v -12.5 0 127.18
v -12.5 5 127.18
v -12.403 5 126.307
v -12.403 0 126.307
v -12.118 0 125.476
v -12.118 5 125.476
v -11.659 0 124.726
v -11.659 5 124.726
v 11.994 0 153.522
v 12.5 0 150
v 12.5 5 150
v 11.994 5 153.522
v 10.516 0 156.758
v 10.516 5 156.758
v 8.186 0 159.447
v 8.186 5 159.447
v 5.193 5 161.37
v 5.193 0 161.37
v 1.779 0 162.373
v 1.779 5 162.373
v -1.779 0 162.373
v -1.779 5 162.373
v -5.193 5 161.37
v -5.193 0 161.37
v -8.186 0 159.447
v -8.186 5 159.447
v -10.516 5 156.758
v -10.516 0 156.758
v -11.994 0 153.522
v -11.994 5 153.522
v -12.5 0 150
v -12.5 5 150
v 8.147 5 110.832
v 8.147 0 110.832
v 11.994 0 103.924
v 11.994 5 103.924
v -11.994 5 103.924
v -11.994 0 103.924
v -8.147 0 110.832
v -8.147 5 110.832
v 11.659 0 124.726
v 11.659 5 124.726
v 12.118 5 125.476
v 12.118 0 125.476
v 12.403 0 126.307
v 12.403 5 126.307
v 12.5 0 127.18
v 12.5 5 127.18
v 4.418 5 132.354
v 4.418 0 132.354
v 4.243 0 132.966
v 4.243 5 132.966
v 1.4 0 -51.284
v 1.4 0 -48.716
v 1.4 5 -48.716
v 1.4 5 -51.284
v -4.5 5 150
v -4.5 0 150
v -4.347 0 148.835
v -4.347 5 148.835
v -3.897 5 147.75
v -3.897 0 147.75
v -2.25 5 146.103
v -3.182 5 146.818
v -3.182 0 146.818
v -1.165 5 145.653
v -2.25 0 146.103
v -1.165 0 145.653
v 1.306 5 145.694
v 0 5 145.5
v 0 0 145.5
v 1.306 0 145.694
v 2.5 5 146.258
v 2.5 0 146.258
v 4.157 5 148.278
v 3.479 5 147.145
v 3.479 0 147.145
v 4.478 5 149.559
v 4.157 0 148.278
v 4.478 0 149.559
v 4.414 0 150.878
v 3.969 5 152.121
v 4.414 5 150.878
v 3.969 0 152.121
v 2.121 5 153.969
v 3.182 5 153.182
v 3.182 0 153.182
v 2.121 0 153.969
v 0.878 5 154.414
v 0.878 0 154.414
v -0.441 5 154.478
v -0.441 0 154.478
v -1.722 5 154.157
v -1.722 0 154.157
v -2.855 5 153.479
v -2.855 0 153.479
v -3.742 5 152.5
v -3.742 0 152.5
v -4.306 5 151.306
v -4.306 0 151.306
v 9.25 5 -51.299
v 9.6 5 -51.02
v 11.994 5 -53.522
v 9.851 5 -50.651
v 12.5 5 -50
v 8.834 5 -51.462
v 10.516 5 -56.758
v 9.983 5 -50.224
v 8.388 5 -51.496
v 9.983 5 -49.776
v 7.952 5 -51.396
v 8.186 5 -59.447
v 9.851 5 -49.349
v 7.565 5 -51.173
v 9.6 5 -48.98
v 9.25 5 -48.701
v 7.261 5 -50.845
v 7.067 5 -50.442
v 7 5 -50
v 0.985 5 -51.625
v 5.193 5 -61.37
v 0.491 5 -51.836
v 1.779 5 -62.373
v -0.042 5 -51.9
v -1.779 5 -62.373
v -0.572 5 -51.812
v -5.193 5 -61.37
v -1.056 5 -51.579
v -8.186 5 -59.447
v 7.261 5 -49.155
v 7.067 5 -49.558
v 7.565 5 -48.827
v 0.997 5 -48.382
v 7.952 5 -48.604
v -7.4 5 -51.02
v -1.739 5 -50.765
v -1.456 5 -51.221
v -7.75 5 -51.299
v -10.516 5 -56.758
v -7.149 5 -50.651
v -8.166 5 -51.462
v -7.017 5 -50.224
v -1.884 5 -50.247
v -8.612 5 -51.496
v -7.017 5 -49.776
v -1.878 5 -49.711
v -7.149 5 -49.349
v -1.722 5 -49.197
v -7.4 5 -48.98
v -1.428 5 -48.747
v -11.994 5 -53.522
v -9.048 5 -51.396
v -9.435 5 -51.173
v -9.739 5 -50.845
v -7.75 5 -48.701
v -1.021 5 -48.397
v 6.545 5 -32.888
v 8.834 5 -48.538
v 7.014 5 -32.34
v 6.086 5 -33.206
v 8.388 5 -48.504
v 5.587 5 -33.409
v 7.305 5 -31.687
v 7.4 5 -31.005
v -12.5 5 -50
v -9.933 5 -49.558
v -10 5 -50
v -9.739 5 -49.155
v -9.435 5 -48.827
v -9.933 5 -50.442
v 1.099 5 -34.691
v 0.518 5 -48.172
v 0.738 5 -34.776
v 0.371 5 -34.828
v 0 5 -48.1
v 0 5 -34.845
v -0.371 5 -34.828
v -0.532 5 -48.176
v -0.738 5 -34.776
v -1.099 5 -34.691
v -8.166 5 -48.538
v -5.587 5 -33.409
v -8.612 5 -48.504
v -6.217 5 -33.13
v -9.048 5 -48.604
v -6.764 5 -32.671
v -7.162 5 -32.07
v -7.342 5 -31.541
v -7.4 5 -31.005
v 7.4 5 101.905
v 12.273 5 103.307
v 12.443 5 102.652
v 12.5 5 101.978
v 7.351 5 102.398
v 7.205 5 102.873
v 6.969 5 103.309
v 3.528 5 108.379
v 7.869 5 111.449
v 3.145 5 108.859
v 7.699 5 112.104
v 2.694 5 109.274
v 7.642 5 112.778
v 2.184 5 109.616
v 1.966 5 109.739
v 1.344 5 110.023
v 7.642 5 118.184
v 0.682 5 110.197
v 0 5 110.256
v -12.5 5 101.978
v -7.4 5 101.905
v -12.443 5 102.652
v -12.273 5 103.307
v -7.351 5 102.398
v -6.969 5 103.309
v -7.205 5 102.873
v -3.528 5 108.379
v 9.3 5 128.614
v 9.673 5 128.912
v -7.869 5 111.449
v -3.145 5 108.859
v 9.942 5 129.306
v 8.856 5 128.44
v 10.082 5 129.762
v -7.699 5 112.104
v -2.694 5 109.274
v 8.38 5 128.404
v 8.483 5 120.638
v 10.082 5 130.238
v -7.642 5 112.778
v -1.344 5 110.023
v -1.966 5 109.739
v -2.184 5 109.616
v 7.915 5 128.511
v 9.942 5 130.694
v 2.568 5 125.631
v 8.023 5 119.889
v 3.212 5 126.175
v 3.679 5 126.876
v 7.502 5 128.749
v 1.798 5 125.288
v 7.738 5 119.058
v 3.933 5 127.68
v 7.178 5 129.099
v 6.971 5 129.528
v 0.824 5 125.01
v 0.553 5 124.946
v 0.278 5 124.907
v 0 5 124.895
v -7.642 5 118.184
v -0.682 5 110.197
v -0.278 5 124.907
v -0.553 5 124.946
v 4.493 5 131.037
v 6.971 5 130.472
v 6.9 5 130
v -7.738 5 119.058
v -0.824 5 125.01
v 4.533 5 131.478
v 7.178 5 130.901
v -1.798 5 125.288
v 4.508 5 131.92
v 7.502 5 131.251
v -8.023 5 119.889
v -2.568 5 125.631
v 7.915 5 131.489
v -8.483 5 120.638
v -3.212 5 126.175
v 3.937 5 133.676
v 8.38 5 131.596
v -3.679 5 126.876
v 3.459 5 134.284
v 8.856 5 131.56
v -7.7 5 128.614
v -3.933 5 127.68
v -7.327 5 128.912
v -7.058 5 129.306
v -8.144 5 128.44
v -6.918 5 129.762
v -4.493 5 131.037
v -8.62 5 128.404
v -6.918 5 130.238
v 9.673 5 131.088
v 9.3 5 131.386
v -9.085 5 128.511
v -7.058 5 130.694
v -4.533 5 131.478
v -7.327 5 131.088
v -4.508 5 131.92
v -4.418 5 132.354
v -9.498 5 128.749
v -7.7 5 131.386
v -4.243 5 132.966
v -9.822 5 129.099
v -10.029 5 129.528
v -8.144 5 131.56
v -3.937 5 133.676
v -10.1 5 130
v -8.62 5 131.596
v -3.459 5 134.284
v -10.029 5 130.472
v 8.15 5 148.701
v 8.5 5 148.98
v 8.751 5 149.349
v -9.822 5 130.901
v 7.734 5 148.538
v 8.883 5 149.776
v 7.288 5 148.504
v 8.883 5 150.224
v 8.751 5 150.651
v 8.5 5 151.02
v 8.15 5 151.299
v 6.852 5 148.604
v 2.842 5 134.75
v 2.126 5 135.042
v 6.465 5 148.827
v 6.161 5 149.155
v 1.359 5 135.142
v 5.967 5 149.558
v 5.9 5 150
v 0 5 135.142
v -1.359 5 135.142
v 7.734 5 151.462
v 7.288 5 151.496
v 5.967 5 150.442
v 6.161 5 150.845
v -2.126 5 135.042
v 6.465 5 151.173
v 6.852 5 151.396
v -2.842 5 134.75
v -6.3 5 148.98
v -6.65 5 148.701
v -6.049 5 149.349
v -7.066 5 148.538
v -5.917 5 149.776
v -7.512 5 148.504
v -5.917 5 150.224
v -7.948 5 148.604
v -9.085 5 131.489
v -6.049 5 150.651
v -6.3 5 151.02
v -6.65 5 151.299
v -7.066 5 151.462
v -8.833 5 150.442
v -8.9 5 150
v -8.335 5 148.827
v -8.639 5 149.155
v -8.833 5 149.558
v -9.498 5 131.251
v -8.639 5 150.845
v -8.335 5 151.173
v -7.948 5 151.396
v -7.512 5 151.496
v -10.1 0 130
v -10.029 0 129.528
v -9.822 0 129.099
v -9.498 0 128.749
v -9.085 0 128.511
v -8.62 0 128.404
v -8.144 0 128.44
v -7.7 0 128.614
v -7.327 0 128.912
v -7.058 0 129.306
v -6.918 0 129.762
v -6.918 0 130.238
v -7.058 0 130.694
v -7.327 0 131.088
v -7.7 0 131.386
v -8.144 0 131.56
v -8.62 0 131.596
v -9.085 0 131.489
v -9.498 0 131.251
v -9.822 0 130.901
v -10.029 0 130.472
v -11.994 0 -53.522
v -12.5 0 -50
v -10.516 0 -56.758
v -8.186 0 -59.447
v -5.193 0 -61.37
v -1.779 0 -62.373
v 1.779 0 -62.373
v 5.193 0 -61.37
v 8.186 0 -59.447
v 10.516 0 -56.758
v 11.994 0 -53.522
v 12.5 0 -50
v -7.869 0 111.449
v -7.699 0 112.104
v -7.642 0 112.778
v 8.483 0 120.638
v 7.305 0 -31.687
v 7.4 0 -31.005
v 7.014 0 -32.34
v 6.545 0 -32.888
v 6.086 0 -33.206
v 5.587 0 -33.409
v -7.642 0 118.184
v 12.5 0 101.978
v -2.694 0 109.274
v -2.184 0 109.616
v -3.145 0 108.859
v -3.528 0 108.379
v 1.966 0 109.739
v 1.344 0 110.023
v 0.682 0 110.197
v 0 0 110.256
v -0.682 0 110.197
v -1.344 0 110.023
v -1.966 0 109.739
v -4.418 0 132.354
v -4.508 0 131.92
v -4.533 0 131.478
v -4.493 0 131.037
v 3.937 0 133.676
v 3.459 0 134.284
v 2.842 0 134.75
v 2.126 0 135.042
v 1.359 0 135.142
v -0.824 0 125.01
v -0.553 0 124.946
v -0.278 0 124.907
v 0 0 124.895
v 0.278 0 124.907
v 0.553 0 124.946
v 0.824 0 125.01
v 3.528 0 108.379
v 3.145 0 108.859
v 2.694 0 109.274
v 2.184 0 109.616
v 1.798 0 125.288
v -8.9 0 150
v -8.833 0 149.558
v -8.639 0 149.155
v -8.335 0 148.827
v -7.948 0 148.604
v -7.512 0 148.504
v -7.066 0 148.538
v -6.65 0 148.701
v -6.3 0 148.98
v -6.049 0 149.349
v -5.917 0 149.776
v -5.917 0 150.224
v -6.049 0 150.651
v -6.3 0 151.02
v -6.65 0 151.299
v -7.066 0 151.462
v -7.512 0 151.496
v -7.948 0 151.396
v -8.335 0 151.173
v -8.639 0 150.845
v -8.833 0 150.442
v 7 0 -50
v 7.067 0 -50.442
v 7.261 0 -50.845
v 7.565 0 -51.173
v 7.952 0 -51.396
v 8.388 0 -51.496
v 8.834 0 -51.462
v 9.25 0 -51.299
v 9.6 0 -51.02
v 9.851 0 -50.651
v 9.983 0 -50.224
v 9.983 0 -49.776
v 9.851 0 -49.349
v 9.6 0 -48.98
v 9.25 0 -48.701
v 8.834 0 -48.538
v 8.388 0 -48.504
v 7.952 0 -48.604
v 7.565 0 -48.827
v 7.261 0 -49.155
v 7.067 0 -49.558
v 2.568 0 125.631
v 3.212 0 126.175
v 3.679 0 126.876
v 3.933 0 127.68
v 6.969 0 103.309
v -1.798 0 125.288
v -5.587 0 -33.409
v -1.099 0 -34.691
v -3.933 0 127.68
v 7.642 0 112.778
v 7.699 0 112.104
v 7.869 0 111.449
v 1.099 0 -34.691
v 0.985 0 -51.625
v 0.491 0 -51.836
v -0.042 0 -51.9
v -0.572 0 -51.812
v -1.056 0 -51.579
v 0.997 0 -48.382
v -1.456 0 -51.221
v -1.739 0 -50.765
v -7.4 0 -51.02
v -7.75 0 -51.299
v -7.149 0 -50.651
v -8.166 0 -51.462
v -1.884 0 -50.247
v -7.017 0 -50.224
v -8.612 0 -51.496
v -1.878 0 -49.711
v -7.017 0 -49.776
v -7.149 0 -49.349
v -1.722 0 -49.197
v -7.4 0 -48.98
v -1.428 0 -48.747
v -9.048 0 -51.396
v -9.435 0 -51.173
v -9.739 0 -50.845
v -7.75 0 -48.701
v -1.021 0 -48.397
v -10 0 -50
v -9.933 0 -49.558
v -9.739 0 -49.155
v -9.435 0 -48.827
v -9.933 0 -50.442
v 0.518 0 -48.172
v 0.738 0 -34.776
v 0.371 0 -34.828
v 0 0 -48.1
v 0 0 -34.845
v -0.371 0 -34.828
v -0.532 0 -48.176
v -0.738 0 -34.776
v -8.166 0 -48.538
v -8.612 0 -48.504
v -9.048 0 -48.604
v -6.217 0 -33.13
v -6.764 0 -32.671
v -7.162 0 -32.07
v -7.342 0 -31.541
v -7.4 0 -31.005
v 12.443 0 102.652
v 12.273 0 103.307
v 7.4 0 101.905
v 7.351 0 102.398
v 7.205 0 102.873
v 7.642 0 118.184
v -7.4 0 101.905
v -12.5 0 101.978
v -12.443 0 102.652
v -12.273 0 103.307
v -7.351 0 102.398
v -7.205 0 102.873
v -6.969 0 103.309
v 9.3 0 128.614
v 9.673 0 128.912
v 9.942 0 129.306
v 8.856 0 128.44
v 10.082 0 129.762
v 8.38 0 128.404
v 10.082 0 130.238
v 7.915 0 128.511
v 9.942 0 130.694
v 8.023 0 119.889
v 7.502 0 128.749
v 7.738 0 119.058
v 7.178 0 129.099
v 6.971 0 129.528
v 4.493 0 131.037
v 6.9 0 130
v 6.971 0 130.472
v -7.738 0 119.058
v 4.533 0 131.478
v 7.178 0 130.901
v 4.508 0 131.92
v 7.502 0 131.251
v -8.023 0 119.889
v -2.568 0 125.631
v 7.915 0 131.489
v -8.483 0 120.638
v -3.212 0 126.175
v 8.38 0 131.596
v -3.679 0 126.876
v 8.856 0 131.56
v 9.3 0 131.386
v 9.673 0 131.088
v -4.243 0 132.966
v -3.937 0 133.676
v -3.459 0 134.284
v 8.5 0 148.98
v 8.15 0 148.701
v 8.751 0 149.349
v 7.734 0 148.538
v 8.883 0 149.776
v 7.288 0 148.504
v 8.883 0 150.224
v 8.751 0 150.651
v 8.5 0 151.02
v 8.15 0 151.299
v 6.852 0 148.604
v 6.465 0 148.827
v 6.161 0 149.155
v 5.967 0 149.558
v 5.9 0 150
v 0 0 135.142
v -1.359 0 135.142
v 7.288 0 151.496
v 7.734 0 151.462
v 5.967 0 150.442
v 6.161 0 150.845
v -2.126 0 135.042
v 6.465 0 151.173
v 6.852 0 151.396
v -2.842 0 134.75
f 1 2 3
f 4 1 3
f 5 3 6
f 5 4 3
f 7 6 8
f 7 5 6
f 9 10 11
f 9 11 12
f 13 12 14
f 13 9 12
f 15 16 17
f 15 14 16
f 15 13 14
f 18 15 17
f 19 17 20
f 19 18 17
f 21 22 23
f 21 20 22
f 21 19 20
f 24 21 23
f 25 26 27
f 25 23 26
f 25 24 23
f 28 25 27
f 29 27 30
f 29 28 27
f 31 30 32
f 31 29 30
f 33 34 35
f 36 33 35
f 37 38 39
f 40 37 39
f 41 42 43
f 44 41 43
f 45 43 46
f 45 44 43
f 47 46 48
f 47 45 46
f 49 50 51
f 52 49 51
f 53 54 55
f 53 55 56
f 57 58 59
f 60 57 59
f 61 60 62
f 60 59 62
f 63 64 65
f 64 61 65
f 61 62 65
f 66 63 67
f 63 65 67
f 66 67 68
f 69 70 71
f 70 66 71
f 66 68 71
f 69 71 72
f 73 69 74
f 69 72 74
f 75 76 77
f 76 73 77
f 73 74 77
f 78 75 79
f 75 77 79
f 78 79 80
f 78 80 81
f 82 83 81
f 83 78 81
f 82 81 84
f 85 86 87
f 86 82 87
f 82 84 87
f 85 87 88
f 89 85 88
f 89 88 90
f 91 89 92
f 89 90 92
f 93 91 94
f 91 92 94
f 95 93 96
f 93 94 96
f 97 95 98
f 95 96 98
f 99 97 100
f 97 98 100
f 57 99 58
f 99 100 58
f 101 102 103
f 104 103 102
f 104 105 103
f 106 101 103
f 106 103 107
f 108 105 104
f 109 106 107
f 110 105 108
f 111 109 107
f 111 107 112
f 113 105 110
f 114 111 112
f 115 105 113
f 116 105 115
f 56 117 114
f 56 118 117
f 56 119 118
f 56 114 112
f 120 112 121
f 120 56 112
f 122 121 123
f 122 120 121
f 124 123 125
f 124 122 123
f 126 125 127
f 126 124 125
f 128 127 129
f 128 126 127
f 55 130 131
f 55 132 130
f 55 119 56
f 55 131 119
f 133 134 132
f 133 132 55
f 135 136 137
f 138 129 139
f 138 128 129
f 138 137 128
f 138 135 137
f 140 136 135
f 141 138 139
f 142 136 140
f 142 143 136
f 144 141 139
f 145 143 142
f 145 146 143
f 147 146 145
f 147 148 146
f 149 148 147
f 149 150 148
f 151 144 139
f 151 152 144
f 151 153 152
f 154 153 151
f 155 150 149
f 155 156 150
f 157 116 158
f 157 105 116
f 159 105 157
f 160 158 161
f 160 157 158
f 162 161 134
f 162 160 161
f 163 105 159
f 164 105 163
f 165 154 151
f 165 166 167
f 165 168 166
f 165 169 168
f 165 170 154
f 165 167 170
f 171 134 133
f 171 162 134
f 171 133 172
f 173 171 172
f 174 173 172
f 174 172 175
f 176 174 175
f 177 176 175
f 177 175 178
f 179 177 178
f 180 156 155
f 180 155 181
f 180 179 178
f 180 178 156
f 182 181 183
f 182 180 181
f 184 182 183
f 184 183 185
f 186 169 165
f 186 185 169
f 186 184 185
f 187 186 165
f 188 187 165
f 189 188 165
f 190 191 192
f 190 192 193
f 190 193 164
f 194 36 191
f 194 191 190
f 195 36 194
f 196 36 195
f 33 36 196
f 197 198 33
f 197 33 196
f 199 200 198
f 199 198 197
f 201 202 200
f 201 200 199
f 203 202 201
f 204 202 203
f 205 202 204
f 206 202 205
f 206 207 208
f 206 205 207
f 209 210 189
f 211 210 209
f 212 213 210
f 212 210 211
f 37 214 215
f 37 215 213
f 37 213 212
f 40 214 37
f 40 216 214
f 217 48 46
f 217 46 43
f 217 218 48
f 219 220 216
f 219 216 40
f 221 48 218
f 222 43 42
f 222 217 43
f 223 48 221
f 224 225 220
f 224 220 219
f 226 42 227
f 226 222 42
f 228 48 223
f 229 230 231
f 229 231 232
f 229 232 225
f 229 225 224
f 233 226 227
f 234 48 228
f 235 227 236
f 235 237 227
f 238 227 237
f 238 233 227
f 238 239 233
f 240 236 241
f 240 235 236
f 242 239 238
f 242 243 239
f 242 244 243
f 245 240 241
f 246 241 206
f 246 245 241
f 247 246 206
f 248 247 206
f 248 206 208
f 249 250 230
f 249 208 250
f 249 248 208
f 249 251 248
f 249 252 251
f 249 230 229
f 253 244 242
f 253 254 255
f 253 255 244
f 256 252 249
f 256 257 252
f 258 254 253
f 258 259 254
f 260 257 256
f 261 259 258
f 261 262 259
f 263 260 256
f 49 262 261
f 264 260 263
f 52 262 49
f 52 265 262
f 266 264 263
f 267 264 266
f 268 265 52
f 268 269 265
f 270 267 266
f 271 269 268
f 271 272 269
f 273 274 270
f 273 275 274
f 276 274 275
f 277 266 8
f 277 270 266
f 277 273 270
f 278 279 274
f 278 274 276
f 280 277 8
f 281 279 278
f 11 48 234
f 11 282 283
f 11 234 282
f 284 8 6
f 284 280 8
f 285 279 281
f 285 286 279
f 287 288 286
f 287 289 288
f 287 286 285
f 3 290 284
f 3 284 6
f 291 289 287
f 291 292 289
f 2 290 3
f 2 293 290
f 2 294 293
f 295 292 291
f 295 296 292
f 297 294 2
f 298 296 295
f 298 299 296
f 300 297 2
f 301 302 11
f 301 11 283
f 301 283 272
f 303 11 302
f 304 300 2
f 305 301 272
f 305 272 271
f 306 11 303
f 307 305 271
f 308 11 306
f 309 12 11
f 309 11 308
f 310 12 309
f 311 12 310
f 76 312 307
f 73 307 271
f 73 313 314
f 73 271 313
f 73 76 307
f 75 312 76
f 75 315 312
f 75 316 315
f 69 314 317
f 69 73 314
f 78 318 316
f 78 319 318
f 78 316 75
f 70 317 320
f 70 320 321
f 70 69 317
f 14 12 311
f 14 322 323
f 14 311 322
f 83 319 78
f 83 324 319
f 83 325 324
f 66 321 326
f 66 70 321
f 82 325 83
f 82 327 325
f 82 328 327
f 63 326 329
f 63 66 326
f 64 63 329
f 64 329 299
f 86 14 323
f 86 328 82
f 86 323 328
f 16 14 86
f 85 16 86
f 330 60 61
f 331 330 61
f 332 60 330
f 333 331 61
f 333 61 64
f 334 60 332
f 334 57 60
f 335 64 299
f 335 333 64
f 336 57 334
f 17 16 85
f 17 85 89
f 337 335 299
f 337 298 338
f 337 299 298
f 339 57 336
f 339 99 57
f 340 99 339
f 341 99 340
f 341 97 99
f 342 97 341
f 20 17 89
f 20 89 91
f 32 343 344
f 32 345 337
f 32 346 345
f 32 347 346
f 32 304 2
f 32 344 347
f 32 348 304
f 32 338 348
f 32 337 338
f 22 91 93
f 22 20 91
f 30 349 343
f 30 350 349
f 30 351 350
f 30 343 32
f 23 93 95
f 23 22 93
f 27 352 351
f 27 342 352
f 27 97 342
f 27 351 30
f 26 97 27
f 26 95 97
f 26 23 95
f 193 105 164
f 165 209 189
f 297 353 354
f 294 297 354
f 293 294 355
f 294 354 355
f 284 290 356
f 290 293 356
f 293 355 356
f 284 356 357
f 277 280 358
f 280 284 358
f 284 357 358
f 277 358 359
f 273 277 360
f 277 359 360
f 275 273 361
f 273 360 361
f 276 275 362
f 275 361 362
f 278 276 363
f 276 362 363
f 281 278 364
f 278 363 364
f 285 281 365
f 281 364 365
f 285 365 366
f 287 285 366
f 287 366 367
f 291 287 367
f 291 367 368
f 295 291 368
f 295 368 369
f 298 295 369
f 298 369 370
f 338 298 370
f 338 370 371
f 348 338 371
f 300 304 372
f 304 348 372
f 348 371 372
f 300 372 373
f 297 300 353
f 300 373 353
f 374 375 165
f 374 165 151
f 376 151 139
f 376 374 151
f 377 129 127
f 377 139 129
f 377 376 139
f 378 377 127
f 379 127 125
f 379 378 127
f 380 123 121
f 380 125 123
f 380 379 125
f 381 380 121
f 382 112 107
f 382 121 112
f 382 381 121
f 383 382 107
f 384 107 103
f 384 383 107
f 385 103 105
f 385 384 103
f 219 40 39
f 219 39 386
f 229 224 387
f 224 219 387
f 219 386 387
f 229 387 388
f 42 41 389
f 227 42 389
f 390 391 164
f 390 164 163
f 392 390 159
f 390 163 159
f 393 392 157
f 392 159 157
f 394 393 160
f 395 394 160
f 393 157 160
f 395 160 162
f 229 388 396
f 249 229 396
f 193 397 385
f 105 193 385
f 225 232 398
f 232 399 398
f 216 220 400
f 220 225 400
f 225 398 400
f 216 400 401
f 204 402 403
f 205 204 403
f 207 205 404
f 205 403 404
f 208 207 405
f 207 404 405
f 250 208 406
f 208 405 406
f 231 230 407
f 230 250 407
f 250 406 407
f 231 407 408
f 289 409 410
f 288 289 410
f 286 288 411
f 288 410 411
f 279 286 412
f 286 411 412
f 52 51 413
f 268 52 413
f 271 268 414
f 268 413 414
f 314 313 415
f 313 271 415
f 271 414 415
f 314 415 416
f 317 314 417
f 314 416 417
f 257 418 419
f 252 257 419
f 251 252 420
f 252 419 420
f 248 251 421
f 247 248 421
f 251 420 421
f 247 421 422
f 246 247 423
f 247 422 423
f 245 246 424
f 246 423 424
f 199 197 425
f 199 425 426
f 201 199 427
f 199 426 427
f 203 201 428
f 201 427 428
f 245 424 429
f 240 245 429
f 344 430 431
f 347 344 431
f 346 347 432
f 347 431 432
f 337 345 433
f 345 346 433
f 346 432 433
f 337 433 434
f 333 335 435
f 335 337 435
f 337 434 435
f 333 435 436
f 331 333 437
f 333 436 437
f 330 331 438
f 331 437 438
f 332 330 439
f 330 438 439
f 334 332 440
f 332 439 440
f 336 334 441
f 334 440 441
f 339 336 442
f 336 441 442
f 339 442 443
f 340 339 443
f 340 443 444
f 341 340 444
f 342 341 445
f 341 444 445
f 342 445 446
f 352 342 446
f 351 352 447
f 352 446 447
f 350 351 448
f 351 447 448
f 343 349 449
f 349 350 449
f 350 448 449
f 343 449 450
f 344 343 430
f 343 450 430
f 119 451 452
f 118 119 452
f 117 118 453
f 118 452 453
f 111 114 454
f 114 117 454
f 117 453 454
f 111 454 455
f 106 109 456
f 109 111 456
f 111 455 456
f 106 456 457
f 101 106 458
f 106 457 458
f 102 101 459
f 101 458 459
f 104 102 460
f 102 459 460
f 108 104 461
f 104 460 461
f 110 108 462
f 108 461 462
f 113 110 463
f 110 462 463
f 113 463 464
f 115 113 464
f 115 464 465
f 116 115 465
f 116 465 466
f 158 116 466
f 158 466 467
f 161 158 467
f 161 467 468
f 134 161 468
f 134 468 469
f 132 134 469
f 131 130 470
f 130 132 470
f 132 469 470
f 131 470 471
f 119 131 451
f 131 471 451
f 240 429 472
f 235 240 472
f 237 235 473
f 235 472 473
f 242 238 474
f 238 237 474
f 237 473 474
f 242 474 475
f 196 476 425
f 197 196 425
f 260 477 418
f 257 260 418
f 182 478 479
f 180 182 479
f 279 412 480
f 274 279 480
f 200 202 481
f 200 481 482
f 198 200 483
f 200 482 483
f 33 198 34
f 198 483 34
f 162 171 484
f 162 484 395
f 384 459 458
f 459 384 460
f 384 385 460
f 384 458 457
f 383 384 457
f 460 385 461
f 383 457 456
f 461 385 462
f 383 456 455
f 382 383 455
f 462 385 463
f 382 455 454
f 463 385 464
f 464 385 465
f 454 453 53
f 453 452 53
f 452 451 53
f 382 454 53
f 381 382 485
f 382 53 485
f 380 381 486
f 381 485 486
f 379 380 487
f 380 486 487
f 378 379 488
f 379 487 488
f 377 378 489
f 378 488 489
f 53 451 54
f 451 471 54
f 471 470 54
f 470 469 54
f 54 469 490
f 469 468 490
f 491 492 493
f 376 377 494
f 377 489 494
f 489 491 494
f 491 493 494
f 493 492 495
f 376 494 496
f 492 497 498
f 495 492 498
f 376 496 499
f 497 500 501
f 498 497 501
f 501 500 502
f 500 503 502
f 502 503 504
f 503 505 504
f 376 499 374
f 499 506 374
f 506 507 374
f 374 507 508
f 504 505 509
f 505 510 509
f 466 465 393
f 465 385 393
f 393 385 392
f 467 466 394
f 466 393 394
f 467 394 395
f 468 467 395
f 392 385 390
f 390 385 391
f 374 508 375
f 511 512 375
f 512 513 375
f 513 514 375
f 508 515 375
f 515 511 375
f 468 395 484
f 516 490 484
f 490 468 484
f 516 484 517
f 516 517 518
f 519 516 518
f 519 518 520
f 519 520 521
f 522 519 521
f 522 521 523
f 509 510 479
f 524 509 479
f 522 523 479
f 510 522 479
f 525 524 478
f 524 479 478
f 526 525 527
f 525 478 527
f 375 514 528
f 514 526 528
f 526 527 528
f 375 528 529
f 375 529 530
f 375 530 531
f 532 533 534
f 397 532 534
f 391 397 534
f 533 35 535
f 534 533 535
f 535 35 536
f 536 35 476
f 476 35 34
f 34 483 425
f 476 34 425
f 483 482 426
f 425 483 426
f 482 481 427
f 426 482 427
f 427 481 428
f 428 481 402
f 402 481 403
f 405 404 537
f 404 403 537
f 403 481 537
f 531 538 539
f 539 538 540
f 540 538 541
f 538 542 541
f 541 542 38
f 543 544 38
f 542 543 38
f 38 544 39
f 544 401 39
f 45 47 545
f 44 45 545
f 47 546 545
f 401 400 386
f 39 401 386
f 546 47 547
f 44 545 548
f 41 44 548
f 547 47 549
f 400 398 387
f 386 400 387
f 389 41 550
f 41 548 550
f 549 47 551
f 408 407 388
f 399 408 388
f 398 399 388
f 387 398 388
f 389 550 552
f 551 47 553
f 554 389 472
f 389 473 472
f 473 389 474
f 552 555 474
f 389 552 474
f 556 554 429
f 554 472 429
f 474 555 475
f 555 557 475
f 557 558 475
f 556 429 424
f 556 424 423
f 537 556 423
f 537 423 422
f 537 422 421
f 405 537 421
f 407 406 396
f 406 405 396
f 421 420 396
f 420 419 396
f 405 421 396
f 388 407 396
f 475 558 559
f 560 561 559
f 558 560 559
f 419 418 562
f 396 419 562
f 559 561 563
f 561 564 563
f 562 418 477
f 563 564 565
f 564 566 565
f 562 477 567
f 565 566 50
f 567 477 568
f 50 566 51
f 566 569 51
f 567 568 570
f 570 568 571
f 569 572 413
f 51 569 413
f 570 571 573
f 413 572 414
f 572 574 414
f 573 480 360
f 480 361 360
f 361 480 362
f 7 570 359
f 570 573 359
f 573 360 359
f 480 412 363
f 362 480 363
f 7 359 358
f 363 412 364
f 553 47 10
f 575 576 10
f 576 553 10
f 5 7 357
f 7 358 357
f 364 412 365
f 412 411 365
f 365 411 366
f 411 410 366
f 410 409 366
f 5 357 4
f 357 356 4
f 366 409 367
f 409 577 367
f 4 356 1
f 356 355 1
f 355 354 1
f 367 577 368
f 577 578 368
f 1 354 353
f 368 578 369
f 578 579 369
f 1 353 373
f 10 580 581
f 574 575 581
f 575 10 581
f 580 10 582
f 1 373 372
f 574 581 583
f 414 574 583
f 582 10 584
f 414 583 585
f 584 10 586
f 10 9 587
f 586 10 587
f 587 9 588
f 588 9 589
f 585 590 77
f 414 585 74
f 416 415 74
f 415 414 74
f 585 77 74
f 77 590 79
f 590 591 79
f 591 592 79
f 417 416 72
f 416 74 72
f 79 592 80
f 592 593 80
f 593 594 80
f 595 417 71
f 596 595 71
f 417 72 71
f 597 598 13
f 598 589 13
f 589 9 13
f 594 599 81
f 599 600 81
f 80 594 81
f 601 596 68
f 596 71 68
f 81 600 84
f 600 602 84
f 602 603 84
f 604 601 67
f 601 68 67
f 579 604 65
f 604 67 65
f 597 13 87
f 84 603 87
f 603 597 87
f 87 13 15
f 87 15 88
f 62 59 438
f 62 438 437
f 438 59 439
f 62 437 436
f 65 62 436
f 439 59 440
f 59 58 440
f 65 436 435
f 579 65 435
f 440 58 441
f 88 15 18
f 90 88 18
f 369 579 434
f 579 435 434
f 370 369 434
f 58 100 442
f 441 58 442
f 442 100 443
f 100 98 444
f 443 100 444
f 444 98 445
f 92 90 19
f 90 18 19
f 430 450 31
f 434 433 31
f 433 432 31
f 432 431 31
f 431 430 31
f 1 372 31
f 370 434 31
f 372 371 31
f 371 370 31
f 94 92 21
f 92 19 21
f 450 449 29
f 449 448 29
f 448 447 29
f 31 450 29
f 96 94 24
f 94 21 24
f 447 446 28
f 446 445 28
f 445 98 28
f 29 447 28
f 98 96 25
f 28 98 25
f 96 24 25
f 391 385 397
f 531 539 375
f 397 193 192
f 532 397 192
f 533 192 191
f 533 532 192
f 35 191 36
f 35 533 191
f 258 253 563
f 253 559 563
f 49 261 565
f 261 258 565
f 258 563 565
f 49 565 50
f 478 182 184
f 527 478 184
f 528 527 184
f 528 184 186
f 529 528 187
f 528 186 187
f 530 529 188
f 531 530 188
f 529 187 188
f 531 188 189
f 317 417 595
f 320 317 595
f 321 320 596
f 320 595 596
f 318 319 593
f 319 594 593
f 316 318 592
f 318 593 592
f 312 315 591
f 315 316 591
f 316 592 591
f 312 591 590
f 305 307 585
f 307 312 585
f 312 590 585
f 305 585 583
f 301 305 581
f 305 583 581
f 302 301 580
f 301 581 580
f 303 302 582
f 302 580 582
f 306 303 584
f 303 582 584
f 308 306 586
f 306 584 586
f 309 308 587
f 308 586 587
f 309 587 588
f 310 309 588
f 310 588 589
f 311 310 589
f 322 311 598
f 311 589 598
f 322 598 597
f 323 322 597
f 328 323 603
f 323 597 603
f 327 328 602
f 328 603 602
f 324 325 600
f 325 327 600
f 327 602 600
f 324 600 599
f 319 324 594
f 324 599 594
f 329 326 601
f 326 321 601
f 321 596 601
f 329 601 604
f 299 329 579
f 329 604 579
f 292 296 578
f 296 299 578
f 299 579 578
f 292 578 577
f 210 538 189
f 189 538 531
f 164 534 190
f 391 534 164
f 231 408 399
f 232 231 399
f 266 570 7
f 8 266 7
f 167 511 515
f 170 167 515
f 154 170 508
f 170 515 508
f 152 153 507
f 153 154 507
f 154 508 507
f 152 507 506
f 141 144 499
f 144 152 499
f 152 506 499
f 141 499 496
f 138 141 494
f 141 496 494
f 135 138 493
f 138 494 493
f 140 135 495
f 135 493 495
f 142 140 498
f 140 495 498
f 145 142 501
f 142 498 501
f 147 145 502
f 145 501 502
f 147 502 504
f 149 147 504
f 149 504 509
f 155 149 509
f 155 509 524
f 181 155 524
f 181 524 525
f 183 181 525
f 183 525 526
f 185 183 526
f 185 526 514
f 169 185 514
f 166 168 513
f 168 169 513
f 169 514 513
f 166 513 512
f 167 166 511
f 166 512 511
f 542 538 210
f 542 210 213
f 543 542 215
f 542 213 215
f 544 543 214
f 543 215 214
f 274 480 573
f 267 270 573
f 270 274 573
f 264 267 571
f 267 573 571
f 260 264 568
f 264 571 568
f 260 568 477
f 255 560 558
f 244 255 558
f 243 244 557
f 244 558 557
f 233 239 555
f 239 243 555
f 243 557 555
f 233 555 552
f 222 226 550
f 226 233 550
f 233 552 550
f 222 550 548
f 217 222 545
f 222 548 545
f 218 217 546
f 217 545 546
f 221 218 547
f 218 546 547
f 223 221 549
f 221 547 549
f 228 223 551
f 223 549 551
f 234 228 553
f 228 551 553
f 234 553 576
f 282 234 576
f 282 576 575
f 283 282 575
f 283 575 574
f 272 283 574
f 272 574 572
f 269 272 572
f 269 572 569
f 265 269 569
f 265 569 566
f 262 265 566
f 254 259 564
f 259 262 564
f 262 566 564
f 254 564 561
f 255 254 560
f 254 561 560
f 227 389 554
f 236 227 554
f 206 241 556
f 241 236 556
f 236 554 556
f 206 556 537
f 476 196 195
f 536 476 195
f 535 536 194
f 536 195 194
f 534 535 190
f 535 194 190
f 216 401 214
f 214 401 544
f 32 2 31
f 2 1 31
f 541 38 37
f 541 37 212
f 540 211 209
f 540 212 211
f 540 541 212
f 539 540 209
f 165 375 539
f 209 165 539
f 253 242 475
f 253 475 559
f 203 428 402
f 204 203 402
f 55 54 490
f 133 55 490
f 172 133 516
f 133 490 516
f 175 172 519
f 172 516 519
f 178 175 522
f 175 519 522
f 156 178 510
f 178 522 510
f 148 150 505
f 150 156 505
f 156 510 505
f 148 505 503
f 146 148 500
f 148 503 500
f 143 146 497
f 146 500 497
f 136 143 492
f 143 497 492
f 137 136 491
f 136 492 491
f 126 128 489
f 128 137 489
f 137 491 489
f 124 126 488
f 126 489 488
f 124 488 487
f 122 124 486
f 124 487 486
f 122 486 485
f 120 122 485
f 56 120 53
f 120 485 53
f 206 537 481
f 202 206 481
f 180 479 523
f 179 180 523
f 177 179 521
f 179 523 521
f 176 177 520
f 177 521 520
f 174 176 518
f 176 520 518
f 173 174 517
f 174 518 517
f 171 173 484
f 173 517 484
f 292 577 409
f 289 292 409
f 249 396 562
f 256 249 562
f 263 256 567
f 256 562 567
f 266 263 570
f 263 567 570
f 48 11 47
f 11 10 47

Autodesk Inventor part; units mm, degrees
ref_plane "YZ Plane" through (0, 0, 0) normal (1, 0, 0) x (0, 1, 0)
ref_plane "XZ Plane" through (0, 0, 0) normal (0, 1, 0) x (-1, 0, 0)
ref_plane "XY Plane" through (0, 0, 0) normal (0, 0, 1) x (1, 0, 0)
sketch "Sketch1" plane through (0, 0, 0) normal (0, 1, 0) x (-1, 0, 0)
  arc A0 (-1.4, -51.2845) -> (-1.4, -48.7155) centre (0, -50) ccw
  line L0 (-1.4, -48.7155) -> (-1.4, -51.2845)
  line L1 (-2.1842, 109.6159) -> (-1.9664, 109.7389)
  arc A1 (1.9664, 109.7389) -> (-1.9664, 109.7389) centre (0, 106.2556) ccw
  line L2 (1.9664, 109.7389) -> (2.1842, 109.6159)
  arc A2 (3.5277, 108.3788) -> (2.1842, 109.6159) centre (0.2179, 106.1326) ccw
  line L3 (3.5277, 108.3788) -> (8.2122, 101.4762)
  arc A3 (8.9023, 99.2105) -> (8.2122, 101.4762) centre (4.9024, 99.23) ccw
  line L4 (8.9023, 99.2105) -> (8.5178, 20.4265)
  arc A4 (5.6167, -33.4003) -> (8.5178, -29.5737) centre (4.5178, -29.5542) ccw
  line L5 (5.6167, -33.4003) -> (1.0989, -34.6911)
  arc A5 (-1.0989, -34.6911) -> (1.0989, -34.6911) centre (0, -30.845) ccw
  line L6 (-1.0989, -34.6911) -> (-5.6167, -33.4003)
  arc A6 (-8.5178, -29.5737) -> (-5.6167, -33.4003) centre (-4.5178, -29.5542) ccw
  line L7 (-8.5178, 20.4265) -> (-8.9023, 99.2105)
  arc A7 (-8.2122, 101.4762) -> (-8.9023, 99.2105) centre (-4.9024, 99.23) ccw
  line L8 (-8.2122, 101.4762) -> (-3.5277, 108.3788)
  arc A8 (-2.1842, 109.6159) -> (-3.5277, 108.3788) centre (-0.2179, 106.1326) ccw
  line L9 (-3.9333, 127.6797) -> (-4.4928, 131.0366)
  arc A9 (-4.4182, 132.354) -> (-4.4928, 131.0366) centre (-1.5336, 131.5298) ccw
  line L10 (-4.4182, 132.354) -> (-4.2433, 132.9662)
  arc A10 (-1.3587, 135.1421) -> (-4.2433, 132.9662) centre (-1.3587, 132.1421) ccw
  line L11 (-1.3587, 135.1421) -> (1.3587, 135.1421)
  arc A11 (4.2433, 132.9662) -> (1.3587, 135.1421) centre (1.3587, 132.1421) ccw
  line L12 (4.2433, 132.9662) -> (4.4182, 132.354)
  arc A12 (4.4928, 131.0366) -> (4.4182, 132.354) centre (1.5336, 131.5298) ccw
  line L13 (4.4928, 131.0366) -> (3.9333, 127.6797)
  arc A13 (1.7983, 125.2884) -> (3.9333, 127.6797) centre (0.9742, 128.1729) ccw
  line L14 (1.7983, 125.2884) -> (0.8242, 125.01)
  arc A14 (-0.8242, 125.01) -> (0.8242, 125.01) centre (0, 127.8946) ccw
  line L15 (-0.8242, 125.01) -> (-1.7983, 125.2884)
  arc A15 (-3.9333, 127.6797) -> (-1.7983, 125.2884) centre (-0.9742, 128.1729) ccw
  arc A16 (-12.5, 127.1805) -> (-11.6588, 124.7265) centre (-8.5, 127.1805) ccw
  line L16 (-11.6588, 124.7265) -> (-8.4827, 120.6384)
  arc A17 (-7.6415, 118.1843) -> (-8.4827, 120.6384) centre (-11.6415, 118.1843) ccw
  line L17 (-7.6415, 118.1843) -> (-7.6415, 112.7784)
  arc A18 (-8.147, 110.832) -> (-7.6415, 112.7784) centre (-11.6415, 112.7784) ccw
  line L18 (-8.147, 110.832) -> (-11.9945, 103.9244)
  arc A19 (-11.9945, 103.9244) -> (-12.5, 101.978) centre (-8.5, 101.978) ccw
  line L19 (-12.5, 101.978) -> (-12.5, 0)
  arc A20 (-12.5, -50) -> (12.5, -50) centre (0, -50) ccw
  line L20 (12.5, 0) -> (12.5, 101.978)
  arc A21 (12.5, 101.978) -> (11.9945, 103.9244) centre (8.5, 101.978) ccw
  line L21 (11.9945, 103.9244) -> (8.147, 110.832)
  arc A22 (7.6415, 112.7784) -> (8.147, 110.832) centre (11.6415, 112.7784) ccw
  line L22 (7.6415, 112.7784) -> (7.6415, 118.1843)
  arc A23 (8.4827, 120.6384) -> (7.6415, 118.1843) centre (11.6415, 118.1843) ccw
  line L23 (8.4827, 120.6384) -> (11.6588, 124.7265)
  arc A24 (11.6588, 124.7265) -> (12.5, 127.1805) centre (8.5, 127.1805) ccw
  line L24 (12.5, 127.1805) -> (12.5, 150)
  arc A25 (12.5, 150) -> (-12.5, 150) centre (0, 150) ccw
  line L25 (-12.5, 150) -> (-12.5, 127.1805)
  circle A26 centre (8.5, -50) radius 1.5
  circle A27 centre (-8.5, -50) radius 1.5
  circle A28 centre (0, 150) radius 4.5
  circle A29 centre (-8.5, 130) radius 1.6
  circle A30 centre (8.5, 130) radius 1.6
  circle A31 centre (-7.4, 150) radius 1.5
  circle A32 centre (7.4, 150) radius 1.5
  line L26 (0, 150) -> (0, -50)
  line L27 (0, -50) -> (0, -30.845)
  line L28 (12.5, 0) -> (12.5, -50)
  line L29 (-12.5, 0) -> (-12.5, -50)
  line L30 (-8.5178, 20.4265) -> (-8.5178, -29.5737)
  line L31 (8.5178, 20.4265) -> (8.5178, -29.5737)
  line L32 (7.4, 102.6729) -> (7.4, -32.3278)
  line L33 (-7.4, 102.6729) -> (-7.4, -32.3278)
  point P0 (0, 0)
  dimension "d0" = 200
  dimension "d1" = 19.155
extrude "Extrusion1" add sketch "Sketch1" along normal blind 5 contours A6 L30 L7 A7 L8 L33 | L32 L3 A3 L4 L31 A4 | L25 A25 L24 A24 L23 A23 L22 A22 L21 A21 L20 L28 A20 L29 L19 A19 L18 A18 L17 A17 L16 A16
fillet "Fillet1" radius 2.5 4 edges at (7.4, 2.5, 102.6729) (-7.4, 2.5, 102.6729) (7.4, 2.5, -32.3278) (-7.4, 2.5, -32.3278)
properties material "Polycarbonate, Clear"
